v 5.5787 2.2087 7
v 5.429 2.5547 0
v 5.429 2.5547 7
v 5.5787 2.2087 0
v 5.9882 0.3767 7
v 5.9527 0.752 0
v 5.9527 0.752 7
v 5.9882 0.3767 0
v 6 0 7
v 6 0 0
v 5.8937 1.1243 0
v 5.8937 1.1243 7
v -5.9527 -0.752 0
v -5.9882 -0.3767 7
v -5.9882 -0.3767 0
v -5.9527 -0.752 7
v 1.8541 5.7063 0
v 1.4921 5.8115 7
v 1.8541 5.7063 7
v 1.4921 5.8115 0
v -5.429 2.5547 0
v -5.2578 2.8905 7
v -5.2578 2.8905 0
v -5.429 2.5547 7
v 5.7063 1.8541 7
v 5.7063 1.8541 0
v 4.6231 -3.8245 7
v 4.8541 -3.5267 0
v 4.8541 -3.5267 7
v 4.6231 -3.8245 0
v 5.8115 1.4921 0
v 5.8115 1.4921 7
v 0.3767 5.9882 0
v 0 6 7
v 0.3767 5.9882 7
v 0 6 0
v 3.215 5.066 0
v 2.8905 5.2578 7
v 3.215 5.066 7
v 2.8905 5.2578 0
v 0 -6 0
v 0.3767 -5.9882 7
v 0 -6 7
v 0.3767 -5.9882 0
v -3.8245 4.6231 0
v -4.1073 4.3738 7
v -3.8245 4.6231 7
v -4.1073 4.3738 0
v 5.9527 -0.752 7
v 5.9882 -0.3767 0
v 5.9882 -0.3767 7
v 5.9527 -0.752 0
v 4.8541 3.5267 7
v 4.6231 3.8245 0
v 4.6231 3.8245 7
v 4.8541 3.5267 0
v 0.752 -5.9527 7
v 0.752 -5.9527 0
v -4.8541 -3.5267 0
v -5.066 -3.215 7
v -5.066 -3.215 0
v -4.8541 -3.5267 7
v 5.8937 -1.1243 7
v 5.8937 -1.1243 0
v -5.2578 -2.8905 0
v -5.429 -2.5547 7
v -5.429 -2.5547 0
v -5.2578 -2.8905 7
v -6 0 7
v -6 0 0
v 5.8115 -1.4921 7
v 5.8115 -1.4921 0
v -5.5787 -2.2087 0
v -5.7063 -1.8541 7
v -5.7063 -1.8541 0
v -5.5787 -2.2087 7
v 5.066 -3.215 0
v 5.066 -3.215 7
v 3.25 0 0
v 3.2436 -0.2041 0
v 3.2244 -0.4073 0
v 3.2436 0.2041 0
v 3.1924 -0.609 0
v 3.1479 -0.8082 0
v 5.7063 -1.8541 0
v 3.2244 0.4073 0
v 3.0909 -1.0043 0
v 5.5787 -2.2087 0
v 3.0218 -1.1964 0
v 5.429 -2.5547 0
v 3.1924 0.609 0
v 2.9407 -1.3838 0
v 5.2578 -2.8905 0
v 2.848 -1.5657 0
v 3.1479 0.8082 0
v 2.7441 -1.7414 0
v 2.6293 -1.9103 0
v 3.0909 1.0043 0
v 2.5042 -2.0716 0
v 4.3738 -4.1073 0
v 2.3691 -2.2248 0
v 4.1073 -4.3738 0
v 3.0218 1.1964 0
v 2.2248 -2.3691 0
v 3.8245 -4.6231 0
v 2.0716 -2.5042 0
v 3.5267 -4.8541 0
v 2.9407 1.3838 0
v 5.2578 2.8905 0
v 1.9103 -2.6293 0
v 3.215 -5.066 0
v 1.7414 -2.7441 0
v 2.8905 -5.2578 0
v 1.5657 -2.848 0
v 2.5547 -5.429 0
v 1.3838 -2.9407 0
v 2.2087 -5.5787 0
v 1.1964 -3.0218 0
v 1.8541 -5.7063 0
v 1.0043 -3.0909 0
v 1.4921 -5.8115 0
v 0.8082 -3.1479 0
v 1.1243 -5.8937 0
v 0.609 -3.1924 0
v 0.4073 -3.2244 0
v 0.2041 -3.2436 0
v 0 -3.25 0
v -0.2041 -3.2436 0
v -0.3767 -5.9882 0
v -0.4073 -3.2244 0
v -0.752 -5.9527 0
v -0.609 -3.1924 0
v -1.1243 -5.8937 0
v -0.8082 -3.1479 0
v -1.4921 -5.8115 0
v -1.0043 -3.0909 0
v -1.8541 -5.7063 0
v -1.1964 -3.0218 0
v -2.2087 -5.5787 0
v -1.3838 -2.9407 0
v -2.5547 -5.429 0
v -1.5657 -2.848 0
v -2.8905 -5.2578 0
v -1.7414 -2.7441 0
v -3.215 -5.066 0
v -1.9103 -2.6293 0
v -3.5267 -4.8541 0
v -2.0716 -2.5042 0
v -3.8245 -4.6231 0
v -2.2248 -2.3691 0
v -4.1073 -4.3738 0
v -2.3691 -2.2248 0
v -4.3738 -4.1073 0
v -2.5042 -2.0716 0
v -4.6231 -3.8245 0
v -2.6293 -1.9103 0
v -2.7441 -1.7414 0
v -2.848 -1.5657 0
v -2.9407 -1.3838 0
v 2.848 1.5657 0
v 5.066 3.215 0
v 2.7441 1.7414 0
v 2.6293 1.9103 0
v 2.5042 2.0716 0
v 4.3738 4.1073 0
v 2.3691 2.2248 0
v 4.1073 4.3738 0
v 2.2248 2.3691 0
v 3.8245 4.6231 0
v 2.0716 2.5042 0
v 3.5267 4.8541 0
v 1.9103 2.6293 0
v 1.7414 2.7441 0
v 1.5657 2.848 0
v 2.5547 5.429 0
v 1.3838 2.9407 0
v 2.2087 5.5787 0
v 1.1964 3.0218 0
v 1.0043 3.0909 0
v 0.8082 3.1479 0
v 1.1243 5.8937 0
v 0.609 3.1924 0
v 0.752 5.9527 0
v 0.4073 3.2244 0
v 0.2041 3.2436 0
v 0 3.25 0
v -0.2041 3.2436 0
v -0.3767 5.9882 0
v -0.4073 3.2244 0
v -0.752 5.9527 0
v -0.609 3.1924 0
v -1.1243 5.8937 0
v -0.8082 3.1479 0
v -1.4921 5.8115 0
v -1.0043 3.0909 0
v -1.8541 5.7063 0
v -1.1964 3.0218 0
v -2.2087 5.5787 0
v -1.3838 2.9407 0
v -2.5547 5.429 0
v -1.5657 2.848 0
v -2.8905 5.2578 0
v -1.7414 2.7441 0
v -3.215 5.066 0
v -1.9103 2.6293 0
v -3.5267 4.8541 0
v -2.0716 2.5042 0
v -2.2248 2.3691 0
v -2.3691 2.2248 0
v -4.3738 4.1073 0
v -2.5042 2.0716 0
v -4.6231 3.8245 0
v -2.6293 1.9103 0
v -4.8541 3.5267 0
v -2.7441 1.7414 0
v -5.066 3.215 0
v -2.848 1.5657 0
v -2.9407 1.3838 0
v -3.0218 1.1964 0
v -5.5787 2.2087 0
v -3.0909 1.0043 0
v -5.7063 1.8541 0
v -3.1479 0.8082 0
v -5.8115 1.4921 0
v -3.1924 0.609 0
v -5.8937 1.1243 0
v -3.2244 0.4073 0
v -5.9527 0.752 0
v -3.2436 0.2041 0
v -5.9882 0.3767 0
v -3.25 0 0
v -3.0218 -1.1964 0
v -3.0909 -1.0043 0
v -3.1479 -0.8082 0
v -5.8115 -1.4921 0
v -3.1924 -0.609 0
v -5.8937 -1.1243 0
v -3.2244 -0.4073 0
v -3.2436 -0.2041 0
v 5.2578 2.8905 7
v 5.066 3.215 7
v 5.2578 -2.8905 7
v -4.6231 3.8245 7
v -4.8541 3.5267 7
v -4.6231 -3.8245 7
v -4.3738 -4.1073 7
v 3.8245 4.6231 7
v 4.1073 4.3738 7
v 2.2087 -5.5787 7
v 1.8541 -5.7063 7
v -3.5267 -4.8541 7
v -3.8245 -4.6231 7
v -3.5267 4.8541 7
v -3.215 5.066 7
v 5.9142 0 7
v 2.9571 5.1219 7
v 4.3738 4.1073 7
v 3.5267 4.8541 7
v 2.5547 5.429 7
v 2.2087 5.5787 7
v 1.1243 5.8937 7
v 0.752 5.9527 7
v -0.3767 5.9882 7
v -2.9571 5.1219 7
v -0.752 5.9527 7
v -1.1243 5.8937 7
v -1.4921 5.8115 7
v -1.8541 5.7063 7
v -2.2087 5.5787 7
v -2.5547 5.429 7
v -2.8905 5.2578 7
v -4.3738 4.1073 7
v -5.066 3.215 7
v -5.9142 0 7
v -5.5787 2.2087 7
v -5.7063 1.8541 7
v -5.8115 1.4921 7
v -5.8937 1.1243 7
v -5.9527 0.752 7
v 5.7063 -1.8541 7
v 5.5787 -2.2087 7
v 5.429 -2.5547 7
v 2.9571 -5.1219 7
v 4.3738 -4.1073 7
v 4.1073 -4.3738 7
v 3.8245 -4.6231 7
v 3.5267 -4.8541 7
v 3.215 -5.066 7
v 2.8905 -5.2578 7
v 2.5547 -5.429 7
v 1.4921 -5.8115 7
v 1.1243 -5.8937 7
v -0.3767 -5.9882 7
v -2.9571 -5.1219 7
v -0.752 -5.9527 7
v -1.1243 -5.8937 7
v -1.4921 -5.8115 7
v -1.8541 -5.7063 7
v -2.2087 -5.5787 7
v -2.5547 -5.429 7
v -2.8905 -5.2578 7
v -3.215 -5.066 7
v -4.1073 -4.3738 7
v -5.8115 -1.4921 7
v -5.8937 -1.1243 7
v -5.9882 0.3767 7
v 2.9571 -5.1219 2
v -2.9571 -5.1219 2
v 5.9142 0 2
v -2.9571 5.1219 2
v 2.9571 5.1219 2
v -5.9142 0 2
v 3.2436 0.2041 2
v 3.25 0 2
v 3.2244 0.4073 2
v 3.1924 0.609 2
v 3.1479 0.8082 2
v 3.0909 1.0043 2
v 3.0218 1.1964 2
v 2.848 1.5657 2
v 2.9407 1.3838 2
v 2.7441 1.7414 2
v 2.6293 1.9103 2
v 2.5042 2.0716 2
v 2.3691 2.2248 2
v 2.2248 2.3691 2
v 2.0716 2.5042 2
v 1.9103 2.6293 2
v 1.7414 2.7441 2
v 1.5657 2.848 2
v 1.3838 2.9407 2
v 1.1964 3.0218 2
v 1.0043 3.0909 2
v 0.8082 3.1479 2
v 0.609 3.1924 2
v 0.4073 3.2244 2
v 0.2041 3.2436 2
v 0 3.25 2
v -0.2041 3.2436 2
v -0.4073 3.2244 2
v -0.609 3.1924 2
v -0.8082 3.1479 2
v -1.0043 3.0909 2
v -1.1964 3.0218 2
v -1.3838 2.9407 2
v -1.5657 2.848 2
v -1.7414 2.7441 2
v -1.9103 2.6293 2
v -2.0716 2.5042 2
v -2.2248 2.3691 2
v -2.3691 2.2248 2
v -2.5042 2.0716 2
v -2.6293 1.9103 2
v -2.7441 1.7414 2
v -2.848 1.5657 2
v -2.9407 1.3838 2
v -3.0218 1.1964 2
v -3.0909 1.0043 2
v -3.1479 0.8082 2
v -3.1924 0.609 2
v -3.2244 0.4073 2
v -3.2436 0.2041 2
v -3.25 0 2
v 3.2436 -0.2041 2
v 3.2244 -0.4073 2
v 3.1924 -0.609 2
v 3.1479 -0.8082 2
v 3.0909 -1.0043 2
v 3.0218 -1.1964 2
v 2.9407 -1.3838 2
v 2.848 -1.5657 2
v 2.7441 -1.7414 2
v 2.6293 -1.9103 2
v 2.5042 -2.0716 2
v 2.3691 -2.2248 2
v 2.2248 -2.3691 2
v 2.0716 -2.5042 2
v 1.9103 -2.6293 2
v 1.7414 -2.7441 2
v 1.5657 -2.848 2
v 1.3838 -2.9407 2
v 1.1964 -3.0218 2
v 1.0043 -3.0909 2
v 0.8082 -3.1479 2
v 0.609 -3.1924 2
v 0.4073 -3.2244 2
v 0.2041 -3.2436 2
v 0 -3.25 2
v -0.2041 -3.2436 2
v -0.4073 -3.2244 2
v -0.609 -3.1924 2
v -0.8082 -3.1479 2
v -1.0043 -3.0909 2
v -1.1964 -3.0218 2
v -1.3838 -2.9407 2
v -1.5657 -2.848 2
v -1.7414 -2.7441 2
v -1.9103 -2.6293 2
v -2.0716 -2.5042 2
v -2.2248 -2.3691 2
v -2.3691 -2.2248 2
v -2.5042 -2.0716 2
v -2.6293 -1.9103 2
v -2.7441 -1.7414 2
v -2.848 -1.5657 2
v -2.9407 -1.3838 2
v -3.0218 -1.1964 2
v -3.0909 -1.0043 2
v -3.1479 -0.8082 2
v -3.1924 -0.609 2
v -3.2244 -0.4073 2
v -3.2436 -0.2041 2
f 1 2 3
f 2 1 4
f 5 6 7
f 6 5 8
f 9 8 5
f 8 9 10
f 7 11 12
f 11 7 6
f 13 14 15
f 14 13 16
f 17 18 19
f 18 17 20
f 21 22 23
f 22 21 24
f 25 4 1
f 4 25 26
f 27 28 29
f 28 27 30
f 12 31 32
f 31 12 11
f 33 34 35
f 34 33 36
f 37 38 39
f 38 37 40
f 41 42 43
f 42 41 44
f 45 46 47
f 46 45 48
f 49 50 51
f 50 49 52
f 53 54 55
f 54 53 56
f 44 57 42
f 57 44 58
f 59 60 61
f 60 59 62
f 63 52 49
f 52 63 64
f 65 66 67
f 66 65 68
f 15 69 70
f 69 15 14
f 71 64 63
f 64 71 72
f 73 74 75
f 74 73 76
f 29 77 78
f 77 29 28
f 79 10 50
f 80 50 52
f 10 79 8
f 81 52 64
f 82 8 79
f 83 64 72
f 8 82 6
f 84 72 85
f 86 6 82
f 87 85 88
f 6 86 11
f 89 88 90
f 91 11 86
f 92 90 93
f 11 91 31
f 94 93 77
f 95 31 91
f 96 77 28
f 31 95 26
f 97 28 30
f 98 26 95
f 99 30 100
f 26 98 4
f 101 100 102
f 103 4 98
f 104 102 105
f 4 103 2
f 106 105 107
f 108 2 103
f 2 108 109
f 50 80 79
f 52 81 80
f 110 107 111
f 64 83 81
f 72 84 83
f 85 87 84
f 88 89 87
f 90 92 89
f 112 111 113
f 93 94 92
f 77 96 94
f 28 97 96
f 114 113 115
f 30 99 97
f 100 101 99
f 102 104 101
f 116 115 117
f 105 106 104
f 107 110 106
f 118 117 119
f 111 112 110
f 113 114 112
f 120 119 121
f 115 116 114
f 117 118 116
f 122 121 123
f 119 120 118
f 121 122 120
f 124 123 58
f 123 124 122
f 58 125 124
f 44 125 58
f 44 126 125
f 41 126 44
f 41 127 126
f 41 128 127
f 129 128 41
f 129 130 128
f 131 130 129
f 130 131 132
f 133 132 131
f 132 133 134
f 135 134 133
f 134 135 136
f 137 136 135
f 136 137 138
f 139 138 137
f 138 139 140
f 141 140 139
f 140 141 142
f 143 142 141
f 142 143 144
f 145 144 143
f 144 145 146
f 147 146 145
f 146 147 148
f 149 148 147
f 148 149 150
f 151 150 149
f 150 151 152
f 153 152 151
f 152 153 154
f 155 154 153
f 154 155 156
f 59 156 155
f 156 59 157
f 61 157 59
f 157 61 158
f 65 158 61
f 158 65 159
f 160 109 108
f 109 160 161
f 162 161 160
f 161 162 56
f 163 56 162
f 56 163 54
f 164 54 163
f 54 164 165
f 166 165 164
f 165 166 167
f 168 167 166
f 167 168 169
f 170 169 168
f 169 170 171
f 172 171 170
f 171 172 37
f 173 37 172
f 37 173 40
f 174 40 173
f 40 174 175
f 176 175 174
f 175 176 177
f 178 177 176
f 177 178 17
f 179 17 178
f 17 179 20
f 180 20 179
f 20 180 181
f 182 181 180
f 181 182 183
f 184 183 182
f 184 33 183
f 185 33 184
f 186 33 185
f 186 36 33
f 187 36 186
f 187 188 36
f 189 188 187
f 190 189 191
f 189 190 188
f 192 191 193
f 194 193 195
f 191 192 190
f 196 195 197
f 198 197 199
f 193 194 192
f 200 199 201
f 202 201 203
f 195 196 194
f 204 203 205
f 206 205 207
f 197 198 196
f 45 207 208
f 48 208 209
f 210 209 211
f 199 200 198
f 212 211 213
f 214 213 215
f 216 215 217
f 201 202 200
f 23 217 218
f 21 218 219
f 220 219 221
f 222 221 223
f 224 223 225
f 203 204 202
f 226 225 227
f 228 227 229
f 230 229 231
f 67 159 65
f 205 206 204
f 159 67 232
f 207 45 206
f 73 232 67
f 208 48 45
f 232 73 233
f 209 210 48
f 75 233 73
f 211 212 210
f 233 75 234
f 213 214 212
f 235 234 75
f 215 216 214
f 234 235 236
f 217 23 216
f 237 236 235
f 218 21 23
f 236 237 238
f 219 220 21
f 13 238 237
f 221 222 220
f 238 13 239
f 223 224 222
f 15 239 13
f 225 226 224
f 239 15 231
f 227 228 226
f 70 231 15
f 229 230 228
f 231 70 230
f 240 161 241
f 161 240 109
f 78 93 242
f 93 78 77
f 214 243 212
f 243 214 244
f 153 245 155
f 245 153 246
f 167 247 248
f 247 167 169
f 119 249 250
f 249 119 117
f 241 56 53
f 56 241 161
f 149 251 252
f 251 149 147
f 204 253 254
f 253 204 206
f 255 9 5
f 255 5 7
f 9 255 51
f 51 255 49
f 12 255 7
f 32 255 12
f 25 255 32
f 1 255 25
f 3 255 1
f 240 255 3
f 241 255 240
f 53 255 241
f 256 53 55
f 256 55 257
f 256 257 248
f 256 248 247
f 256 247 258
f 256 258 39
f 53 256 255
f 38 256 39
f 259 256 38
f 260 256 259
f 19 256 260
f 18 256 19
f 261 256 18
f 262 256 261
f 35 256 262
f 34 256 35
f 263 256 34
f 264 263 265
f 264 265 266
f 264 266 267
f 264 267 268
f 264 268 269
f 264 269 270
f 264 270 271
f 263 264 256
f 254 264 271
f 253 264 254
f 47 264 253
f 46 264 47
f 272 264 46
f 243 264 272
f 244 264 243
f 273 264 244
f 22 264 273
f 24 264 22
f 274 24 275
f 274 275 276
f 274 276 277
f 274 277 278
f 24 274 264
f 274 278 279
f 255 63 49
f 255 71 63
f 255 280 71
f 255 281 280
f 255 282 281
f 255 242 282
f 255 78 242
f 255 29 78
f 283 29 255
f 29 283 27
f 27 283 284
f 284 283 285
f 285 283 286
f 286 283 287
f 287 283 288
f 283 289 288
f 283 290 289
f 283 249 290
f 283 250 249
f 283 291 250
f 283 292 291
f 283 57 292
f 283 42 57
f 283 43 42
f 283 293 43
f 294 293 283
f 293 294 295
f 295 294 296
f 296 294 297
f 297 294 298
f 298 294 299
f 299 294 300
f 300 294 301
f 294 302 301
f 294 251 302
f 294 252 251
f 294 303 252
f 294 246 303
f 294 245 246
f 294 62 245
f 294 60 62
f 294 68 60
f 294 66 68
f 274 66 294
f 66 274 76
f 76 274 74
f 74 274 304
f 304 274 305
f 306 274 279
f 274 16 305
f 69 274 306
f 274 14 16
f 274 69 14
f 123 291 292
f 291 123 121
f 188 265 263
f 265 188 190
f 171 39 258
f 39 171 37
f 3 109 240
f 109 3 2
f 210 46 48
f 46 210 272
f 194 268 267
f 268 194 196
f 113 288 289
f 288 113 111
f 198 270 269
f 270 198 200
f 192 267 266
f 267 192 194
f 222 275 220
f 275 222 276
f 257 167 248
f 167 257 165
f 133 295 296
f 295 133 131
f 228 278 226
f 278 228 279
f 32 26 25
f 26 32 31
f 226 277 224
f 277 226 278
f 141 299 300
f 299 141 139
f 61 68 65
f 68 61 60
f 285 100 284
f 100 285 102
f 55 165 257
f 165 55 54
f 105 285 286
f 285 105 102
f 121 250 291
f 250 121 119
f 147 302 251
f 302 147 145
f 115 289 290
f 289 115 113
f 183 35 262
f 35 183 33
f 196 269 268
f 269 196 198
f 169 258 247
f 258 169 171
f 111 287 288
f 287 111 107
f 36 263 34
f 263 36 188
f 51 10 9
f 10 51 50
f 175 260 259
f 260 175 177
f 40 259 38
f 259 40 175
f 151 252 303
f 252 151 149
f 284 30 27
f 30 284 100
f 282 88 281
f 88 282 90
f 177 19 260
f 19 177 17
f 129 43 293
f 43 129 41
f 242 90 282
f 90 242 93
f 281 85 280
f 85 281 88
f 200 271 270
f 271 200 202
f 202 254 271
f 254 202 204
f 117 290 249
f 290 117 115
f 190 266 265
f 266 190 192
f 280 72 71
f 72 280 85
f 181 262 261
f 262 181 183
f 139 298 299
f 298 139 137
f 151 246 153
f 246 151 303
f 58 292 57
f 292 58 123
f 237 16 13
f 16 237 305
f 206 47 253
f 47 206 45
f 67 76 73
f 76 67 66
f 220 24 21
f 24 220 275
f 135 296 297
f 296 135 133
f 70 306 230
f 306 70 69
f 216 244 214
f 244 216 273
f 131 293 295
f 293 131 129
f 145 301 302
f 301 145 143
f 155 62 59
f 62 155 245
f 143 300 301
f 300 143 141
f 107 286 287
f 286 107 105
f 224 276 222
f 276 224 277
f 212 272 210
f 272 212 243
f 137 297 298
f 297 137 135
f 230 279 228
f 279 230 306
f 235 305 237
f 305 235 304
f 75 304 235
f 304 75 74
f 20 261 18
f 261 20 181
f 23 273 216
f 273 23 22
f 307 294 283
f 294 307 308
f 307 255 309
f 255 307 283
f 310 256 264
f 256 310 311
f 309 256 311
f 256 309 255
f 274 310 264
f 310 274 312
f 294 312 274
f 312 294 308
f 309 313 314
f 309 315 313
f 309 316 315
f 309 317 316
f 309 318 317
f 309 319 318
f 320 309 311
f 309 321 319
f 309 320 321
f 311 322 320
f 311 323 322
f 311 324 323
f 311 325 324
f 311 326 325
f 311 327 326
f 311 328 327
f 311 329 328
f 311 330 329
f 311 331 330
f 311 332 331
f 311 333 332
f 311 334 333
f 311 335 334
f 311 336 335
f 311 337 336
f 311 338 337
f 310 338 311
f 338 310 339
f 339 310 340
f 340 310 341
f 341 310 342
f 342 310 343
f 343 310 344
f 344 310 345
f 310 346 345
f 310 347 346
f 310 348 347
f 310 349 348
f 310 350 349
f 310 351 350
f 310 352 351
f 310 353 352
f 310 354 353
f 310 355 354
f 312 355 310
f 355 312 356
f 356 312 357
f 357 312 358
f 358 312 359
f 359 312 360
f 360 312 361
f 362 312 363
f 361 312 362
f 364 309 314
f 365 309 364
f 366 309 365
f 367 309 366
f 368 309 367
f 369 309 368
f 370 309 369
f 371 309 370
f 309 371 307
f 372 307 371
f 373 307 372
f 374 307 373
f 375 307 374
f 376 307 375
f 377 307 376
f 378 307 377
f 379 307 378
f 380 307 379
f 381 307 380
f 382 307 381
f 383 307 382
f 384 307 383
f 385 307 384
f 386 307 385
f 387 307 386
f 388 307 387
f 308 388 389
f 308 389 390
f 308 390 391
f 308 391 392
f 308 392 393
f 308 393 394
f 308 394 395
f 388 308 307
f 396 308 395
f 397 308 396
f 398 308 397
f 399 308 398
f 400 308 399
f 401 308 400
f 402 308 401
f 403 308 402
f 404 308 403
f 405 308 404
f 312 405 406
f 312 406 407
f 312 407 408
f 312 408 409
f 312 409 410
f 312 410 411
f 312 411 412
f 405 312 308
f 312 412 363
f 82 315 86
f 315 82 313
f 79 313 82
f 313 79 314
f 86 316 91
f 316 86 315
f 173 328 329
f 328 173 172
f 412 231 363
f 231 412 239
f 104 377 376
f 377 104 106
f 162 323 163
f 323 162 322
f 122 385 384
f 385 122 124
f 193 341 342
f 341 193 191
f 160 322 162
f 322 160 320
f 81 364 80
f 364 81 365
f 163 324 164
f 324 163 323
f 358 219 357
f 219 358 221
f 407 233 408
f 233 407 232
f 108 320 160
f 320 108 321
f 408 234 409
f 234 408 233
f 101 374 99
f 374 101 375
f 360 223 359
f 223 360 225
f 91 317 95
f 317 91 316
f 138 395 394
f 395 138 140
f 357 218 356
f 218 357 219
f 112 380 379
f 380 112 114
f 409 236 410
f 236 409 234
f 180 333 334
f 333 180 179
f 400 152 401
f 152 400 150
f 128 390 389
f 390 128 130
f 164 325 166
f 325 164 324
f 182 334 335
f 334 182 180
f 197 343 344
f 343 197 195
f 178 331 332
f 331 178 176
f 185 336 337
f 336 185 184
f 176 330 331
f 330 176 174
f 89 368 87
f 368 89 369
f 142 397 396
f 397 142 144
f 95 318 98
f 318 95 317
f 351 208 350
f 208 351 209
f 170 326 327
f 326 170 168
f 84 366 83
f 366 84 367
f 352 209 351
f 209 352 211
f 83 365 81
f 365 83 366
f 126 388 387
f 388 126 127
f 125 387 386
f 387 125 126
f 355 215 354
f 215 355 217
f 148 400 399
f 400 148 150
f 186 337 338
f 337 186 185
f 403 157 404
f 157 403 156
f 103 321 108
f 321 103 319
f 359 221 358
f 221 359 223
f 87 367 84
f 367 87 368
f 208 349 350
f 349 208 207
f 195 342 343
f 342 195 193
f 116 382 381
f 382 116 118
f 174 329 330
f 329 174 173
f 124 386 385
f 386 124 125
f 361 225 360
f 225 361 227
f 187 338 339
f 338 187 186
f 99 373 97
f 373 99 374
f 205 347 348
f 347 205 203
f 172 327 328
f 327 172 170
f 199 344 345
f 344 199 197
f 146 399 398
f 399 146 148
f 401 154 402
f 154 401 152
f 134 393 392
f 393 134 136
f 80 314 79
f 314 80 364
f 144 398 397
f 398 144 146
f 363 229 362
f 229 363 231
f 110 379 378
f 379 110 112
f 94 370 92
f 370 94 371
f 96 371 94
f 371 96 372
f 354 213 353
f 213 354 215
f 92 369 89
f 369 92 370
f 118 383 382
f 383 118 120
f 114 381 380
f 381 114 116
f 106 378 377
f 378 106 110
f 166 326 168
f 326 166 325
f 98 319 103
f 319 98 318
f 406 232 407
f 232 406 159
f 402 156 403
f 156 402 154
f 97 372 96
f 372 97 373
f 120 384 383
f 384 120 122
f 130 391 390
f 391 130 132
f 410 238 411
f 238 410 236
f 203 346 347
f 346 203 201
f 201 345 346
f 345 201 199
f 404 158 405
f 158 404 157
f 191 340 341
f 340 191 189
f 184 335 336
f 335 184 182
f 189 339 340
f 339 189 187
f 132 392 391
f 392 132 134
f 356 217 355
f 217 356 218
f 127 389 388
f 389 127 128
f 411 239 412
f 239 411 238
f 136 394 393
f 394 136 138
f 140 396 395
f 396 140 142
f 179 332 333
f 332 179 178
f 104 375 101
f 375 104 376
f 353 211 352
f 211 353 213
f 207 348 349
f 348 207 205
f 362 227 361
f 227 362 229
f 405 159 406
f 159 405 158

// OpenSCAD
$fn = 100;

difference() {
    cylinder(h=7, d=12);
    translate([0, 0, 2])
        cylinder(h=5, r=5.91425, $fn=6);
    translate([0, 0, -1])
        cylinder(h=9, r=3.25);
}
